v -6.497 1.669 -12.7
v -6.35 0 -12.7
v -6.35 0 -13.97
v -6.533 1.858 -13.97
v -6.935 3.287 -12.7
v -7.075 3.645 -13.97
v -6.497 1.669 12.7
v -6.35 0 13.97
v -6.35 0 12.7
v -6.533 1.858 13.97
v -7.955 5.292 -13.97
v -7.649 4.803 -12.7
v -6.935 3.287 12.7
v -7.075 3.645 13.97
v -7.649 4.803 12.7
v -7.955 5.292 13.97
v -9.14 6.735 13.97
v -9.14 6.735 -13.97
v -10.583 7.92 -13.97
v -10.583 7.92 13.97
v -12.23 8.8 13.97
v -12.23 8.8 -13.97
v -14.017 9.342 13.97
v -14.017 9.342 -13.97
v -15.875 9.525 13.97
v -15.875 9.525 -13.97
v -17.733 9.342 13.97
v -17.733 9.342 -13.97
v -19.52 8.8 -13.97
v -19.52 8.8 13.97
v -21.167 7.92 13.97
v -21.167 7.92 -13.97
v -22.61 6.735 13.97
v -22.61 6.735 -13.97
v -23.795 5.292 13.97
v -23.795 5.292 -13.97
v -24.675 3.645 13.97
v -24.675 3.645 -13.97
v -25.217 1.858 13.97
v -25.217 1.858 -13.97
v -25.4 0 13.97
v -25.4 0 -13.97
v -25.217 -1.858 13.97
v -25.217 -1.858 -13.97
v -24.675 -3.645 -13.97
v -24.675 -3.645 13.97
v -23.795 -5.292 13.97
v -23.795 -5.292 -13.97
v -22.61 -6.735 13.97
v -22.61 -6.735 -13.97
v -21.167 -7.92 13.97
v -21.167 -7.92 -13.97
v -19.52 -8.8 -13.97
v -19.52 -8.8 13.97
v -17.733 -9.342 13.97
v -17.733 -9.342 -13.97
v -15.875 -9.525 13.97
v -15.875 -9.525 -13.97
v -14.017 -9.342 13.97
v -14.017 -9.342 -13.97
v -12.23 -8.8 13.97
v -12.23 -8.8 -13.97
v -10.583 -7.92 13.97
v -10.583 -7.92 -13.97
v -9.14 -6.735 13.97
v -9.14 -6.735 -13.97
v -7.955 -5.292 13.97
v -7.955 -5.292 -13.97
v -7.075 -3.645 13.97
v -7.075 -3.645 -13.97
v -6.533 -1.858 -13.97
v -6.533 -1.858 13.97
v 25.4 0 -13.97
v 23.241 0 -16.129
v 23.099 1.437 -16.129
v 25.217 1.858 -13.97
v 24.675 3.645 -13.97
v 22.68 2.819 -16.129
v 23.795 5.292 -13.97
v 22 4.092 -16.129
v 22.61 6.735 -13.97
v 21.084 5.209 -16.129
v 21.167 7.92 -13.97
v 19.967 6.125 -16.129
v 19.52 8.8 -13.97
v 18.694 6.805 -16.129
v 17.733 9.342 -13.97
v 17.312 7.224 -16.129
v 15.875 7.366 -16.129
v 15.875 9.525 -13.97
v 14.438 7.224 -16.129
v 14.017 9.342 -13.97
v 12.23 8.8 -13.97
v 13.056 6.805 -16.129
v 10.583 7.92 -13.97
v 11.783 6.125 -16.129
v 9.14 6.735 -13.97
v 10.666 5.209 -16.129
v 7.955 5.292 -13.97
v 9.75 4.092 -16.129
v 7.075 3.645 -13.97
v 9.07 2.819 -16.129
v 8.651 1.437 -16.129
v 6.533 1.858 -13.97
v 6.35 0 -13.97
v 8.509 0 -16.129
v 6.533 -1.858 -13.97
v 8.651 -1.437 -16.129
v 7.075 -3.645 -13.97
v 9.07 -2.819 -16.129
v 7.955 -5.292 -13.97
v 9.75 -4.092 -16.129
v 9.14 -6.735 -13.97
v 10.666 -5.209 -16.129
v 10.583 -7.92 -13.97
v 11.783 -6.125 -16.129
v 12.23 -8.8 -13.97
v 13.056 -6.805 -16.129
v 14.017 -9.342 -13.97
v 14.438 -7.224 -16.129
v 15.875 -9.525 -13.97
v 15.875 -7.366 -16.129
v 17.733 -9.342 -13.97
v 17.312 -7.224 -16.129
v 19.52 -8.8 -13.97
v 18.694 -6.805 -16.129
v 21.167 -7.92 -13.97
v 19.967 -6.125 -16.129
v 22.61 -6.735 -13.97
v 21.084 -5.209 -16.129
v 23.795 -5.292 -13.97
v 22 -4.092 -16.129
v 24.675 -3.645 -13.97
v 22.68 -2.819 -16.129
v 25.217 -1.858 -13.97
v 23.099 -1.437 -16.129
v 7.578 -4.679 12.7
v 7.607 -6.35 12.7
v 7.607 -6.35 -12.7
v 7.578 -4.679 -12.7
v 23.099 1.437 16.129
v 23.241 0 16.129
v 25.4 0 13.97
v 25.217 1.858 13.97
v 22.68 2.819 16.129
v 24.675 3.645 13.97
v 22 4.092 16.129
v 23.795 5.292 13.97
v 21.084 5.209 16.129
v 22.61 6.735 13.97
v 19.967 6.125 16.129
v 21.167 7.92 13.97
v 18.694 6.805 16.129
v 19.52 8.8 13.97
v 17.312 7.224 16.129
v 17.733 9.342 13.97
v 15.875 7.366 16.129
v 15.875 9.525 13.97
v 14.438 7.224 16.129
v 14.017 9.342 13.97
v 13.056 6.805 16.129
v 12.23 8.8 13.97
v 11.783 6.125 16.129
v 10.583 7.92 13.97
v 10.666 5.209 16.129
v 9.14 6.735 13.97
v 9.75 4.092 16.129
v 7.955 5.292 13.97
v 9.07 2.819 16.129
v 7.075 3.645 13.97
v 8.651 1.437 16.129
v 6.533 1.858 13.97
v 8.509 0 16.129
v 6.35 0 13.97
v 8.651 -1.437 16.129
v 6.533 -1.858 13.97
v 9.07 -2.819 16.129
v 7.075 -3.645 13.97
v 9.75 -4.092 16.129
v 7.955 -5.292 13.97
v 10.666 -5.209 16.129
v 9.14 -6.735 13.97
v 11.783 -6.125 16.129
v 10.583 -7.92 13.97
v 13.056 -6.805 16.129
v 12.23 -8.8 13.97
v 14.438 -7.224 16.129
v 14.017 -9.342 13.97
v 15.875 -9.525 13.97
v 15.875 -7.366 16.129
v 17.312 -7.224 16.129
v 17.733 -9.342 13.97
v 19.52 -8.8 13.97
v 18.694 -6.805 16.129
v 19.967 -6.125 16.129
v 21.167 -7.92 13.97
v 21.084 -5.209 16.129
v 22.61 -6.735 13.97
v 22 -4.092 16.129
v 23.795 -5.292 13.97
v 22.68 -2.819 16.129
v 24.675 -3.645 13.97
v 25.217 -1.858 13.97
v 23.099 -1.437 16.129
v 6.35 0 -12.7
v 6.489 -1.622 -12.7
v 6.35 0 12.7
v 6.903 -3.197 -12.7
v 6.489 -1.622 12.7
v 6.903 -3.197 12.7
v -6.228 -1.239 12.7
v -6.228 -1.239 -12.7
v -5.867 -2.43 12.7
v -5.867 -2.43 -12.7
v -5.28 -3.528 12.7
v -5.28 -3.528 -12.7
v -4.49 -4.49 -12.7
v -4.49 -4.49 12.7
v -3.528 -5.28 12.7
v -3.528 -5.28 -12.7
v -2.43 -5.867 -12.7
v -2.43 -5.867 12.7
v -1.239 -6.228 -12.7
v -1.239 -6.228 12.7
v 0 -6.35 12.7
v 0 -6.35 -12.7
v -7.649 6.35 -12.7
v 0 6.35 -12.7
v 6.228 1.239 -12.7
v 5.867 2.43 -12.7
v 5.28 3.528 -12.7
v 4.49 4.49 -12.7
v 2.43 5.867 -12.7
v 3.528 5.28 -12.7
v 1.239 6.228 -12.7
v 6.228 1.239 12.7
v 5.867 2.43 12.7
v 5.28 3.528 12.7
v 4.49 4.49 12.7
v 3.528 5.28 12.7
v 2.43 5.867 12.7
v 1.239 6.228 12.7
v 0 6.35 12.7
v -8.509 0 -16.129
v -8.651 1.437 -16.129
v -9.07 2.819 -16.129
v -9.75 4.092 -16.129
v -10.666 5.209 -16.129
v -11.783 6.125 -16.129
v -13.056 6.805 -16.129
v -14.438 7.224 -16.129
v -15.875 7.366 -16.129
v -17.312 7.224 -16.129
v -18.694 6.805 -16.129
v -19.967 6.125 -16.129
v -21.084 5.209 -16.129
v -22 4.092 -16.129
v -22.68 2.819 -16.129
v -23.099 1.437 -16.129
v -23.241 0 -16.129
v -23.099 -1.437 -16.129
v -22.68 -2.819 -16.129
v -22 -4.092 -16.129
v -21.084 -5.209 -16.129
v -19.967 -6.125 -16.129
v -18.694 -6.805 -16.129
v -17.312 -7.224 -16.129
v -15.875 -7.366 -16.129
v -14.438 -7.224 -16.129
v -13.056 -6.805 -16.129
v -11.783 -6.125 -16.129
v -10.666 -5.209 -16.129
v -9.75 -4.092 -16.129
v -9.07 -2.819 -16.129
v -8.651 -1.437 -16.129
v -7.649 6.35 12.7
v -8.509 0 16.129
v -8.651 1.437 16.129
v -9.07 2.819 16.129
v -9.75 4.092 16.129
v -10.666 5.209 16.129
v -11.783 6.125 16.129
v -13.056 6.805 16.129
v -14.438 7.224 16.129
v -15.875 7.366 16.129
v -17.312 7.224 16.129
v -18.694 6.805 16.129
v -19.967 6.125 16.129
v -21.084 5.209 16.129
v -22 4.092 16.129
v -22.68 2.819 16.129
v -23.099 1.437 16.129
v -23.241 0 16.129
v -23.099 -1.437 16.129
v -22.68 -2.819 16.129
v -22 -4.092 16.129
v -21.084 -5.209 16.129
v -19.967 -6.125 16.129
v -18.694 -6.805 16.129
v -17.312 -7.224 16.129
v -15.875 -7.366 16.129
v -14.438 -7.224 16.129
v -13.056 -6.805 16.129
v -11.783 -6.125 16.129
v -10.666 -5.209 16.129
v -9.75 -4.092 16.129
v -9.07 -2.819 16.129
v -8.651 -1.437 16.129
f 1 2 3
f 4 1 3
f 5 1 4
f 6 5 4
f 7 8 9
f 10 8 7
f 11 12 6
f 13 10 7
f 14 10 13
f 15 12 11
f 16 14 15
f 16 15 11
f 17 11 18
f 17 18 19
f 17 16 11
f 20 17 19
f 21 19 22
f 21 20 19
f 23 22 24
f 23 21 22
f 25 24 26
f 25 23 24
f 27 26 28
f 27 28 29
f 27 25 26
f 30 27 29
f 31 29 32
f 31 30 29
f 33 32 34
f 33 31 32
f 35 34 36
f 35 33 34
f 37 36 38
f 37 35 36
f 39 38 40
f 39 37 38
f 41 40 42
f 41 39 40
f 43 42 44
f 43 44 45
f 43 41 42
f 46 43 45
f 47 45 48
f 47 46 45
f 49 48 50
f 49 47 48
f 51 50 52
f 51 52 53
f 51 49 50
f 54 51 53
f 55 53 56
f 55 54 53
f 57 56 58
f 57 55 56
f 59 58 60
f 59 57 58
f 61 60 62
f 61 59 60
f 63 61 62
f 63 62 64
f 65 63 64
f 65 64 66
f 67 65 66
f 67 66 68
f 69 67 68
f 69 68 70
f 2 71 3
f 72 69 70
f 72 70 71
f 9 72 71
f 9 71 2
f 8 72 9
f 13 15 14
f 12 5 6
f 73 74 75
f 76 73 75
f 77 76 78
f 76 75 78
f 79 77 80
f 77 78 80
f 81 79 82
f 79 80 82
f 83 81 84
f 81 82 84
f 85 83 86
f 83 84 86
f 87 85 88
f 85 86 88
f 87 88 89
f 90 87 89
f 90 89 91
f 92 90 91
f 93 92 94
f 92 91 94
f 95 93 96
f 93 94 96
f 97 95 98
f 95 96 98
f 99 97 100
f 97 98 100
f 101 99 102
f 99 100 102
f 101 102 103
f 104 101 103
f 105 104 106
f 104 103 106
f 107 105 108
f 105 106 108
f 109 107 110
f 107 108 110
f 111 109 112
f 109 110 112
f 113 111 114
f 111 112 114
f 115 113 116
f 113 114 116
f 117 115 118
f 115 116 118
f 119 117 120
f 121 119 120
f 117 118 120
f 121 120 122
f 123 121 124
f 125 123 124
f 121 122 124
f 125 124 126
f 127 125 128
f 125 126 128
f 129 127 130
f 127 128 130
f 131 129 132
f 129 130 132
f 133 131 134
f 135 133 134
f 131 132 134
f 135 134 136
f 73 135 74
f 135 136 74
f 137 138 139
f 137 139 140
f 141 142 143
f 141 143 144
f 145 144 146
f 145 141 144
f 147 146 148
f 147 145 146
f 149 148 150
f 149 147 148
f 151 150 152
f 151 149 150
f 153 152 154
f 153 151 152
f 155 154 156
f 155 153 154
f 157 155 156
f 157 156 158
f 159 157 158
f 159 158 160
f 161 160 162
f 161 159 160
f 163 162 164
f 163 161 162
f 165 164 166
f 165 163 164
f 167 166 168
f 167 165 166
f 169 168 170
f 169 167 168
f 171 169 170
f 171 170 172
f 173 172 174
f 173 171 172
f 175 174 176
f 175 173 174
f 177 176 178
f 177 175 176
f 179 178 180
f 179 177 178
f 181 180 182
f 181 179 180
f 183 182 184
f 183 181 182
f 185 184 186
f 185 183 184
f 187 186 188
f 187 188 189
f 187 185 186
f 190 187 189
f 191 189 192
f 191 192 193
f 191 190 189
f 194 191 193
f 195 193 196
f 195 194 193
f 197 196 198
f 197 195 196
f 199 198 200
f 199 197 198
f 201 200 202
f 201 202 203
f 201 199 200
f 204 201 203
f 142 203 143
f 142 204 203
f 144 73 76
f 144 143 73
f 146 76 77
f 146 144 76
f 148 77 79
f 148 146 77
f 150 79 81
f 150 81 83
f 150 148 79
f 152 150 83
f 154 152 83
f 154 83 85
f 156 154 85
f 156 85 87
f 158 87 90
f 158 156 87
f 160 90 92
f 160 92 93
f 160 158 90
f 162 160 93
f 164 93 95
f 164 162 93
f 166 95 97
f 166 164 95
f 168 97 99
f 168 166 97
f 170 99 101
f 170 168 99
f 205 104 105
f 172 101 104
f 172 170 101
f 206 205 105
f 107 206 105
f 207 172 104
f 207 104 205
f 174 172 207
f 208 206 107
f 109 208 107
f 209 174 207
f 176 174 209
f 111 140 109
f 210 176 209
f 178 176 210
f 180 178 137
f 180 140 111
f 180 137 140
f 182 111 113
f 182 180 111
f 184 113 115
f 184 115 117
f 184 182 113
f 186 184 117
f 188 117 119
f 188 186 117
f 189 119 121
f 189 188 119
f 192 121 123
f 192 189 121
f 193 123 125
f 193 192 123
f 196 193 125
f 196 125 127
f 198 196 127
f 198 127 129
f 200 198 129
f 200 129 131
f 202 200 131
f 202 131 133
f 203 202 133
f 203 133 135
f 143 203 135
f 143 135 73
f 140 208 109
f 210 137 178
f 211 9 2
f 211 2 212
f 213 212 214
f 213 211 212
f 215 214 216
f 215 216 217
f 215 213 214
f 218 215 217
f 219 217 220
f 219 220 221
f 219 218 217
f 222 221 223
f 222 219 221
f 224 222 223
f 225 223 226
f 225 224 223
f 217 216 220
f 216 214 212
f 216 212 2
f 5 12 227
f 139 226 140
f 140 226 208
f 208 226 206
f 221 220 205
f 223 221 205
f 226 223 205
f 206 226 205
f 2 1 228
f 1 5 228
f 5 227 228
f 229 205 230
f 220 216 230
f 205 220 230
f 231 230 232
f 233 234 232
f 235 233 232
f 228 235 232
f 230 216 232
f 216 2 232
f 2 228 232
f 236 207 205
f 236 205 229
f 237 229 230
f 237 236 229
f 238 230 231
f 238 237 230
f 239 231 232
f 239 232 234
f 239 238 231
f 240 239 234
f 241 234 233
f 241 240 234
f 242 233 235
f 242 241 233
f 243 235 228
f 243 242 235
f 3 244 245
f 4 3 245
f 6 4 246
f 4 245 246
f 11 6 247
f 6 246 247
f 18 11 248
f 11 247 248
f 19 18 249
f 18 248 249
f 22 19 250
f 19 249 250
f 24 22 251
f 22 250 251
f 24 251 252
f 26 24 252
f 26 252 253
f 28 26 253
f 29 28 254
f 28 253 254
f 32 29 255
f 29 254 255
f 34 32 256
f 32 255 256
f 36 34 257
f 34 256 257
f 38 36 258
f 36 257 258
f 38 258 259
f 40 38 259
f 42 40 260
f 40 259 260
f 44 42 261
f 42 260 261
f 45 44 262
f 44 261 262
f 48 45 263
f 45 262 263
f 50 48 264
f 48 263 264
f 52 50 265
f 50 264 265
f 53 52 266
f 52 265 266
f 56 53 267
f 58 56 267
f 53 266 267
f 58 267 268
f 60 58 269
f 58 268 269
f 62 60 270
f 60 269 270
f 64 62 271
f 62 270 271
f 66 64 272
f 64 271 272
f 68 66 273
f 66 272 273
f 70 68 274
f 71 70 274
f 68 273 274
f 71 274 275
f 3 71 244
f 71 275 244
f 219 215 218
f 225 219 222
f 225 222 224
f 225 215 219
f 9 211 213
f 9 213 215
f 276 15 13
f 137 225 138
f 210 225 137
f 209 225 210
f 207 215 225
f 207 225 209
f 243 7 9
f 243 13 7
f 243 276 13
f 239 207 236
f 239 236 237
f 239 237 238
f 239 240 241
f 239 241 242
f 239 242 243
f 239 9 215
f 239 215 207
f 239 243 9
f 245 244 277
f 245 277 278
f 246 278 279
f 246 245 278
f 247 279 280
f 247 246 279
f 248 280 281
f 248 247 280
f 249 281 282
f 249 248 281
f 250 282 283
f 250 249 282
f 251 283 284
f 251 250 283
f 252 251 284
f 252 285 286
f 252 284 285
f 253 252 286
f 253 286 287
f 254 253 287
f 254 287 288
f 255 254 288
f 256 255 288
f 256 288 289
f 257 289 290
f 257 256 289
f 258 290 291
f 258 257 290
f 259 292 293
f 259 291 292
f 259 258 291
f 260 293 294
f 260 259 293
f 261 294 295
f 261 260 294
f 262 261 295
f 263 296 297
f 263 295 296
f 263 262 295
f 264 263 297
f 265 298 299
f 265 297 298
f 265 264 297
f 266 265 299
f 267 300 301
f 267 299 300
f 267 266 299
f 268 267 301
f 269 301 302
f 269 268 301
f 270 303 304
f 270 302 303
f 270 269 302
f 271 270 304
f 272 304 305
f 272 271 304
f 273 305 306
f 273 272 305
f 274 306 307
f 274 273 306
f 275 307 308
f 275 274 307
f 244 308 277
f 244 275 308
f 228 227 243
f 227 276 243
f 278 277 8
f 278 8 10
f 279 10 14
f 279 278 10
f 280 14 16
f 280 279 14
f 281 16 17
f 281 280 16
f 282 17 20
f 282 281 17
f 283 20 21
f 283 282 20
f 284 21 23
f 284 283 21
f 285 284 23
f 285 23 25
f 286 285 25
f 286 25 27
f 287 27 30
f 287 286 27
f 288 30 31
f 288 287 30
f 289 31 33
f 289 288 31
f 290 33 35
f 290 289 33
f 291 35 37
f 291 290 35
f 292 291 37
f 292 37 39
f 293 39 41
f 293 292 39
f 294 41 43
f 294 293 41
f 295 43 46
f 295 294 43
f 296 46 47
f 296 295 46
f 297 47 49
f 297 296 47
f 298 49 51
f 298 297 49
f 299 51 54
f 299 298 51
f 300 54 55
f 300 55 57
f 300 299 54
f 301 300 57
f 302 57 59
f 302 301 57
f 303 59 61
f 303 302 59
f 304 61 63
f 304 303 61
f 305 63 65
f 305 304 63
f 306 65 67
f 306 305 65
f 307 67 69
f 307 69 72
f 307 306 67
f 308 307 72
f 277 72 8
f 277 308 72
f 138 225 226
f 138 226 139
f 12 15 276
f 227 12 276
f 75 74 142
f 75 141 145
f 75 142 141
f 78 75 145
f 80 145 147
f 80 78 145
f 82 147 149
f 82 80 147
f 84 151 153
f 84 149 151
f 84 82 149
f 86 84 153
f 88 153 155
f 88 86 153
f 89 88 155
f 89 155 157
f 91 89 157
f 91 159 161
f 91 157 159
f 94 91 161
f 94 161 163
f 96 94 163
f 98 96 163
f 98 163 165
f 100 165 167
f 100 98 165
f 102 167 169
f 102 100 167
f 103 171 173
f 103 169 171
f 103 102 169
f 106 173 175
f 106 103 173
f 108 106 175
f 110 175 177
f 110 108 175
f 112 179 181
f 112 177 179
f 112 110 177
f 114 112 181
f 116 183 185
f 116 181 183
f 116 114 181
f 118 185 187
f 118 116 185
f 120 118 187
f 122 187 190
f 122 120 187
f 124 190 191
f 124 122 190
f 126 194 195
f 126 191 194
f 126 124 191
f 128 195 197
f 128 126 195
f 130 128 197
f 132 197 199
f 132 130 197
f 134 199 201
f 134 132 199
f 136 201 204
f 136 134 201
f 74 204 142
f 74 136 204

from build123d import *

# Parameters (mm, degrees)
F0_R     = 9.525
F0_R_2   = 7.366
F1_DEPTH = 19.05
F2_R     = 6.35
F3_DEPTH = 12.7
F4_W     = 7.6494621422
F4_H     = 6.35
F5_DEPTH = 12.7


# Not quite as in the source:
# - a fillet or chamfer that OpenCascade refuses, or shapes differently, is made with other operations: its cross-section is extruded or revolved along the edge and cut away or added


with BuildPart() as f1:
    # F0 (on Top) → F1 (new body, symmetric)
    with BuildSketch(Plane.XY):
        with Locations((-15.875, 0)):
            Circle(F0_R)
        with Locations((-15.875, 0)):
            Circle(F0_R_2, mode=Mode.SUBTRACT)
    extrude(amount=F1_DEPTH, both=True)



with BuildPart() as f1b:
    # F0 (on Top) → F1, piece 2 (new body, symmetric)
    with BuildSketch(Plane.XY):
        with Locations((15.875, 0)):
            Circle(F0_R)
        with Locations((15.875, 0)):
            Circle(F0_R_2, mode=Mode.SUBTRACT)
    extrude(amount=F1_DEPTH, both=True)


with BuildPart() as f1_1:
    add(f1.part)

    add(f1b.part)  # F3 merges F1b
    # F2 (on Top) → F3 (join, symmetric)
    with BuildSketch(Plane.XY):
        Circle(F2_R)
    extrude(amount=F3_DEPTH, both=True)

    # F4 (on Top) → F5 (join, symmetric)
    with BuildSketch(Plane.XY):
        with Locations((-3.8247310711, 3.175)):
            Rectangle(F4_W, F4_H)
        Polygon((7.4973143637, 0), (0, 0), (0, -6.35), (7.6071062533, -6.35), align=None)
    extrude(amount=F5_DEPTH, both=True)

    # F6: chamfer of 5.08 on 4 edges, made by hand

    # F6_s1 → F6_t2 (revolve, cut)
    with BuildSketch(Plane.XZ):
        Polygon((25.4, 13.97), (20.32, 19.05), (25.4, 19.05), align=None)
    revolve(axis=Axis((15.875, 0, 19.05), (0, 0, 1)), mode=Mode.SUBTRACT)

    # F6_s3 → F6_t4 (revolve, cut)
    with BuildSketch(Plane.XZ):
        Polygon((-6.35, 13.97), (-11.43, 19.05), (-6.35, 19.05), align=None)
    revolve(axis=Axis((-15.875, 0, 19.05), (0, 0, 1)), mode=Mode.SUBTRACT)

    # F6_s5 → F6_t6 (revolve, cut)
    with BuildSketch(Plane.XZ):
        Polygon((25.4, -13.97), (20.32, -19.05), (25.4, -19.05), align=None)
    revolve(axis=Axis((15.875, 0, -19.05), (0, 0, 1)), mode=Mode.SUBTRACT)

    # F6_s7 → F6_t8 (revolve, cut)
    with BuildSketch(Plane.XZ):
        Polygon((-6.35, -13.97), (-11.43, -19.05), (-6.35, -19.05), align=None)
    revolve(axis=Axis((-15.875, 0, -19.05), (0, 0, 1)), mode=Mode.SUBTRACT)


solid = f1_1.part
